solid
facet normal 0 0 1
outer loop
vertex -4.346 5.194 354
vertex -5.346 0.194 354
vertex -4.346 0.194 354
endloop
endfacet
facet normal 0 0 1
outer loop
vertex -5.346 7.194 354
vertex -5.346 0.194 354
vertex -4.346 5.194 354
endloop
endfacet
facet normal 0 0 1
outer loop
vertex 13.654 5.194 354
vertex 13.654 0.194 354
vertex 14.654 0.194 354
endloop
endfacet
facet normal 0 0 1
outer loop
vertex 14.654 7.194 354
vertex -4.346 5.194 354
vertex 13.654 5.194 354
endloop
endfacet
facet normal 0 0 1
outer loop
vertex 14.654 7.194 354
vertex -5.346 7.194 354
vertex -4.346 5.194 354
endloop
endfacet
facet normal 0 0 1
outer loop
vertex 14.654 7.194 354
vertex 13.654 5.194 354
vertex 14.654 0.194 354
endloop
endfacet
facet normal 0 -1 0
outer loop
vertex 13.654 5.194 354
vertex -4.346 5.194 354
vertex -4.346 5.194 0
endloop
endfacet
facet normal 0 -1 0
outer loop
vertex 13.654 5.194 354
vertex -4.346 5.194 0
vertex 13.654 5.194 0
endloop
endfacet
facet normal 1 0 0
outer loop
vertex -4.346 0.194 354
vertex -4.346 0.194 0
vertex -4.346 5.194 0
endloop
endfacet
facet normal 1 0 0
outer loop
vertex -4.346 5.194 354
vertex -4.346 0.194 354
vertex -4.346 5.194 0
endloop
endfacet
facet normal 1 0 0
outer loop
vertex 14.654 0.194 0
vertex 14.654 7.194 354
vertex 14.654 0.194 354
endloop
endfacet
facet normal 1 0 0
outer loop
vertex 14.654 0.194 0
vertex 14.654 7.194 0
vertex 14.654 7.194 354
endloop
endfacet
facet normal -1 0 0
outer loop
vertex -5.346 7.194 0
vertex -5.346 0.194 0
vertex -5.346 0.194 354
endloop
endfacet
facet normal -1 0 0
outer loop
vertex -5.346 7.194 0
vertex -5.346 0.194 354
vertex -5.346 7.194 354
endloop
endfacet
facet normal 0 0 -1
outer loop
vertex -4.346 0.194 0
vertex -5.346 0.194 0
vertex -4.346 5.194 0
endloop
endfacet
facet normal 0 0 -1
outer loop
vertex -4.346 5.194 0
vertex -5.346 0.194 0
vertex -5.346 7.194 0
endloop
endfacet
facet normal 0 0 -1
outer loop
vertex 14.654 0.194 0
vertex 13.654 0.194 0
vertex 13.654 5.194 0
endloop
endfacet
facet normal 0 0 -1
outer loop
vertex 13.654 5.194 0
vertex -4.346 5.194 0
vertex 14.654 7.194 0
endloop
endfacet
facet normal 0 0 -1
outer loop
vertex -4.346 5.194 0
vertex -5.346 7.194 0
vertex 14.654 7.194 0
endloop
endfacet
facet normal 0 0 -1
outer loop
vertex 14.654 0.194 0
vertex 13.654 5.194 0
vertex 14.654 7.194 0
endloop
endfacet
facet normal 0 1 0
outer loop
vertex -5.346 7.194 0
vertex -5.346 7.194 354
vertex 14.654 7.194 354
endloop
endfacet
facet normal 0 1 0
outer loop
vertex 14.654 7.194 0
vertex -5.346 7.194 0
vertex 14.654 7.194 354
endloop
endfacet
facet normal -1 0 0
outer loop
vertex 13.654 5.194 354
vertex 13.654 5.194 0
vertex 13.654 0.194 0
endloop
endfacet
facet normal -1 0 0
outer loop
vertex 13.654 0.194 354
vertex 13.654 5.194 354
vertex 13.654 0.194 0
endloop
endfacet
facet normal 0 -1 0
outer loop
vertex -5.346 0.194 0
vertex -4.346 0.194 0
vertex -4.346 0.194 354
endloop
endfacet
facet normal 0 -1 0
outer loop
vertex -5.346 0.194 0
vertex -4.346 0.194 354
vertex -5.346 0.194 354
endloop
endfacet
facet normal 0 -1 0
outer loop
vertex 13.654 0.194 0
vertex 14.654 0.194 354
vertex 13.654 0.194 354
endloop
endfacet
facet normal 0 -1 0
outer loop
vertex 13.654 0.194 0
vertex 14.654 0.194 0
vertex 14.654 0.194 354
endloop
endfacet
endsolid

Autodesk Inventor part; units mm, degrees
ref_plane "YZ Plane" through (0, 0, 0) normal (1, 0, 0) x (0, 1, 0)
ref_plane "XZ Plane" through (0, 0, 0) normal (0, 1, 0) x (-1, 0, 0)
ref_plane "XY Plane" through (0, 0, 0) normal (0, 0, 1) x (1, 0, 0)
sketch "Sketch1" plane through (0, 0, 0) normal (0, 0, 1) x (1, 0, 0)
  line L0 (-5.3462, 7.1935) -> (14.6538, 7.1935)
  line L1 (14.6538, 7.1935) -> (14.6538, 0.1935)
  line L2 (14.6538, 0.1935) -> (-5.3462, 0.1935)
  line L3 (-5.3462, 0.1935) -> (-5.3462, 7.1935)
  dimension "d0" = 20
  dimension "d1" = 7
extrude "Extrusion1" add sketch "Sketch1" along normal blind 354
sketch "Boceto2" plane through (0, 0, 354) normal (0, 0, 1) x (1, 0, 0)
  line L0 (-5.3462, 7.1935) -> (-5.3462, 0.1935) projected
  line L1 (-5.3462, 0.1935) -> (-4.3462, 0.1935)
  line L2 (-5.3462, 0.1935) -> (14.6538, 0.1935) projected
  line L3 (-5.3462, 7.1935) -> (-4.3462, 7.1935)
  line L4 (14.6538, 7.1935) -> (-5.3462, 7.1935) projected
  line L5 (-4.3462, 7.1935) -> (-4.3462, 5.1935)
  line L6 (-4.3462, 0.1935) -> (-4.3462, 5.1935)
  line L7 (-4.3462, 5.1935) -> (14.6538, 5.1935)
  line L8 (14.6538, 5.1935) -> (13.6538, 5.1935)
  line L9 (13.6538, 5.1935) -> (13.6538, 0.1935)
  line L10 (-4.3462, 0.1935) -> (13.6538, 0.1935)
  point P0 (0, 0)
  dimension "d4" = 1
  dimension "d5" = 1
  dimension "d6" = 2
  dimension "d7" = 1
extrude "Extrusión2" cut sketch "Boceto2" against normal blind 364.5 contours L6 L7 L9 L2
properties part number "Soporte LED_L=354" material "Stainless Steel, Austenitic"
